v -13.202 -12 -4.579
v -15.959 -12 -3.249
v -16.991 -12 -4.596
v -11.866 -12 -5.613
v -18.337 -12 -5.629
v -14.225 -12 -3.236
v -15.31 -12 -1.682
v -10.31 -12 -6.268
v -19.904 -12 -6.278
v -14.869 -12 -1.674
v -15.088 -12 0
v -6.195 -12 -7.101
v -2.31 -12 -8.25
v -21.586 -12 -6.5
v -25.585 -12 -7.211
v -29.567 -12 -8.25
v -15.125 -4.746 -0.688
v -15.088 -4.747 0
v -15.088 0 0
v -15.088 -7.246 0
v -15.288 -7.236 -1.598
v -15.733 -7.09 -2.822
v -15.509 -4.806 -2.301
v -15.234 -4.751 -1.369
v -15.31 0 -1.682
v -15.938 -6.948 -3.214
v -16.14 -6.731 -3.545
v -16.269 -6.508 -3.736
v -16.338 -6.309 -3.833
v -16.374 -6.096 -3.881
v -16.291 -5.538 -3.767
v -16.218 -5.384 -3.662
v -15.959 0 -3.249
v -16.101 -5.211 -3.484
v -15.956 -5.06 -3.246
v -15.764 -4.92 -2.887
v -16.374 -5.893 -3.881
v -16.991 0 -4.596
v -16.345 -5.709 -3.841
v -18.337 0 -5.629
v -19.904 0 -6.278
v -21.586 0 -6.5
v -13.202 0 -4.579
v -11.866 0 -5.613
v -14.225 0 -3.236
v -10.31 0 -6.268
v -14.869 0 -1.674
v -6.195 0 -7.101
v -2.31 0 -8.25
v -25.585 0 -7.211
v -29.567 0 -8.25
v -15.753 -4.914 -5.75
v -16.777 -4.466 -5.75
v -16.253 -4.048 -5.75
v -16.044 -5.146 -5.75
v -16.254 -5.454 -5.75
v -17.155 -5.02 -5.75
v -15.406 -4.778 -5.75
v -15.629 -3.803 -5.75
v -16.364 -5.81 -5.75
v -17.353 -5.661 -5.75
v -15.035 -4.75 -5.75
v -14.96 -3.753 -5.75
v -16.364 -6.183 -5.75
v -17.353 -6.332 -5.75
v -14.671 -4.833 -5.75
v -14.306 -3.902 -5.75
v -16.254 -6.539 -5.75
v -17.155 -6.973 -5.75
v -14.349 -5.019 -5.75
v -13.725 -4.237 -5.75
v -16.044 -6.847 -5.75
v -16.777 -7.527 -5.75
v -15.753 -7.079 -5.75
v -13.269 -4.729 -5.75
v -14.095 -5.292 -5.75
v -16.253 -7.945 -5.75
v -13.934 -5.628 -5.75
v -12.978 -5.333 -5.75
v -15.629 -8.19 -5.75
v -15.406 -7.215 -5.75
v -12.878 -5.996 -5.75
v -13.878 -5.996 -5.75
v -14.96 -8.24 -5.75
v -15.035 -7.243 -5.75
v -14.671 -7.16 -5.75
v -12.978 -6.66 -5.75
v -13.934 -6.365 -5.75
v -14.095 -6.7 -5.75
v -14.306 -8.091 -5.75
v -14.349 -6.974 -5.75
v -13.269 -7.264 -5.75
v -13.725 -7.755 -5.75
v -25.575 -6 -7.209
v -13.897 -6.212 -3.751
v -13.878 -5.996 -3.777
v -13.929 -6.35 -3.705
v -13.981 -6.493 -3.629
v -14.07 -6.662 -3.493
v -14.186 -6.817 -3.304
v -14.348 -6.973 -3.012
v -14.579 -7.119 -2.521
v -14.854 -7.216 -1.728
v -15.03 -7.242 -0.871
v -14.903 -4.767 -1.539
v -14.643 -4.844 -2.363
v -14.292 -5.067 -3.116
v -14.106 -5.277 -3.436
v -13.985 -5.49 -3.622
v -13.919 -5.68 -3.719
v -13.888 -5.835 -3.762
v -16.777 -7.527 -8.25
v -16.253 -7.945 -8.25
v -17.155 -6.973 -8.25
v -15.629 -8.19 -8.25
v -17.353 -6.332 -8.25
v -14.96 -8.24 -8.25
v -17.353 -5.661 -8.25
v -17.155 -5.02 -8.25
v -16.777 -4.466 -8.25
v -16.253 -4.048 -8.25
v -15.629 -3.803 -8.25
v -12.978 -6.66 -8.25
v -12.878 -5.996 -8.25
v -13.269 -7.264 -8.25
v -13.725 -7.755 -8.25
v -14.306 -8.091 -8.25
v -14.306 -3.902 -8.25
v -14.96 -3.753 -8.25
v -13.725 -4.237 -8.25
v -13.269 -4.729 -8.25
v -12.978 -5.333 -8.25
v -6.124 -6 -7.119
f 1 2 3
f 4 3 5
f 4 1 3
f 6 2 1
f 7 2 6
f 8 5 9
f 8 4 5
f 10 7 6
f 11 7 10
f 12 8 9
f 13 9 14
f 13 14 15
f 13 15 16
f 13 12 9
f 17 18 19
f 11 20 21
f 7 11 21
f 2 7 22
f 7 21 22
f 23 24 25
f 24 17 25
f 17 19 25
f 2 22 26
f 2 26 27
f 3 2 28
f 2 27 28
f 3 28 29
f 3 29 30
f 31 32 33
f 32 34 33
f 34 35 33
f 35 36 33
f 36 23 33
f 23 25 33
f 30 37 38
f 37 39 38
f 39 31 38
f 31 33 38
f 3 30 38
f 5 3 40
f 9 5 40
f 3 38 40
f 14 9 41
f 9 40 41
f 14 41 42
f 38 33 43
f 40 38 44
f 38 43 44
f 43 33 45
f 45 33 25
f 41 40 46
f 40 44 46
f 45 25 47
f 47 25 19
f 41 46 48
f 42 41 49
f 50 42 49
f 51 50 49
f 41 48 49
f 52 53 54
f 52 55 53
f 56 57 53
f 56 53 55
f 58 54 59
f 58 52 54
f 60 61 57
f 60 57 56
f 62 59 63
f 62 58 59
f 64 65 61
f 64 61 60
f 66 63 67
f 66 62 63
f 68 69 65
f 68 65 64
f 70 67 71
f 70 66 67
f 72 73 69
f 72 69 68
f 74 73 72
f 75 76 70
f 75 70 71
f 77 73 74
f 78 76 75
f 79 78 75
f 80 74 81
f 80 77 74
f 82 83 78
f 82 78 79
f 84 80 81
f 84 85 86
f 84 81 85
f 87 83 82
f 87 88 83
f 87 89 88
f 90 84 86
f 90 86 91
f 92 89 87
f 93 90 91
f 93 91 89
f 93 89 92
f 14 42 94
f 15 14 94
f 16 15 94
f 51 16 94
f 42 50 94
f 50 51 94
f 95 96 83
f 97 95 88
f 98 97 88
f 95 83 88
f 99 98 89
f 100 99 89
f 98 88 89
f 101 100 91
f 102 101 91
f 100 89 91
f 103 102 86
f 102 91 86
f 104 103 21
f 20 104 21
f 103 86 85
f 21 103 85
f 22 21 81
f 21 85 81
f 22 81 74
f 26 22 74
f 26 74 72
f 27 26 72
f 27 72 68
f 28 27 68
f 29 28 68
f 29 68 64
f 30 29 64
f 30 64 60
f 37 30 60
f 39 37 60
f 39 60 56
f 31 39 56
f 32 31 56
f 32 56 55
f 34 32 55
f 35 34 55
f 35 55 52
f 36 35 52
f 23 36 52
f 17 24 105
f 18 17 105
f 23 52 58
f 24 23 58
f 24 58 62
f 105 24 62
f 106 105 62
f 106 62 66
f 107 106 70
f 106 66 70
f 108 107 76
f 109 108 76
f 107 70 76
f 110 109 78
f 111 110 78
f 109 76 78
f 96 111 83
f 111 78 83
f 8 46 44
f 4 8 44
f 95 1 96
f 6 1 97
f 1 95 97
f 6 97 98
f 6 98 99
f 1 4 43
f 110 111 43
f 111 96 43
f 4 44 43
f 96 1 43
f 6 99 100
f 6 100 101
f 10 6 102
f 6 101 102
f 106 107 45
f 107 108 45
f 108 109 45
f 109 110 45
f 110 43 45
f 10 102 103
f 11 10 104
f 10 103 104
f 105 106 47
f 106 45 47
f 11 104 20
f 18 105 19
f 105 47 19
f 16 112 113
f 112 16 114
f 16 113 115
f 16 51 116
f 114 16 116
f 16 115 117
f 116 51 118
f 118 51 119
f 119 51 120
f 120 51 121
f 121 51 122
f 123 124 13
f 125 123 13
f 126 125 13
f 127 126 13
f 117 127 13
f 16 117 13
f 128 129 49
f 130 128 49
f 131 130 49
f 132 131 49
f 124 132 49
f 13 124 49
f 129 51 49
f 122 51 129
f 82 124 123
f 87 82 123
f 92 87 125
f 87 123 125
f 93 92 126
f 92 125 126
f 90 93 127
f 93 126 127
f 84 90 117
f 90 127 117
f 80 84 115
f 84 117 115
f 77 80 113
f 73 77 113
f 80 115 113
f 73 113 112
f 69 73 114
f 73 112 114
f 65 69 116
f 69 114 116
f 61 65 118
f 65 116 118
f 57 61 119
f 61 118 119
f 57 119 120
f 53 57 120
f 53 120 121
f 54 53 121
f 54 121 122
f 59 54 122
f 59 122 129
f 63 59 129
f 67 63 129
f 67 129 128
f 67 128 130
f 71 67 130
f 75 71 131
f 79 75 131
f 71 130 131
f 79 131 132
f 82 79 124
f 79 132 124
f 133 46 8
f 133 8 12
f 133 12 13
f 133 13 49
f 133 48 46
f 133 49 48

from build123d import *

# Parameters (mm, degrees)
F1_DEPTH = 12
F2_R     = 1.25
F3_DEPTH = 25
F2_R_2   = 2.25
F4_DEPTH = 2.5


with BuildPart() as f1:
    # F0 (on Front) → F1 (new body)
    with BuildSketch(Plane.XZ):
        with BuildLine():
            ThreePointArc((-15.0881102346, 0), (-16.991298859, -4.5955766968), (-21.5863641351, -6.4999997655))
            Line((-21.5863641351, -6.4999997655), (-21.5863641351, -8.2499998827))
            Line((-21.5863641351, -8.2499998827), (-10.3100242913, -8.2499998827))
            Line((-10.3100242913, -8.2499998827), (-10.3100242913, -6.2677756805))
            ThreePointArc((-10.3100242913, -6.2677756805), (-13.7573675008, -3.9406572188), (-15.0881102346, 0))
        make_face()
        with BuildLine():
            Line((-21.5863641351, -8.2499998827), (-21.5863641351, -6.4999997655))
            add(Edge.make_bspline(
                [(-21.5863641351, -6.4999997655), (-22.9185539989, -6.7095944516), (-25.5951490164, -7.1307056669), (-28.238998845, -7.875768386), (-29.566956684, -8.2499998827)],
                knots=[0, 0, 0, 0, 0.4977181288, 1, 1, 1, 1], degree=3))
            Line((-29.566956684, -8.2499998827), (-21.5863641351, -8.2499998827))
        make_face()
        with BuildLine():
            add(Edge.make_bspline(
                [(-10.3100242913, -6.2677756805), (-8.8950325252, -6.524315434), (-6.1143970315, -7.0284480808), (-3.563055622, -7.847662156), (-2.3100242913, -8.2499998827)],
                knots=[0, 0, 0, 0, 0.508873518, 1, 1, 1, 1], degree=3))
            Line((-10.3100242913, -6.2677756805), (-10.3100242913, -8.2499998827))
            Line((-10.3100242913, -8.2499998827), (-2.3100242913, -8.2499998827))
        make_face()
    extrude(amount=F1_DEPTH)

    # F2 (on face) → F3 (cut)
    with BuildSketch(Plane(origin=(0, 0, -8.2499998827), x_dir=(1, 0, 0), z_dir=(0, 0, -1))):
        with Locations((-15.1280872524, 5.9963222593)):
            Circle(F2_R)
    extrude(amount=-F3_DEPTH, mode=Mode.SUBTRACT)

    # F2 (on face) → F4 (cut)
    with BuildSketch(Plane(origin=(0, 0, -8.2499998827), x_dir=(1, 0, 0), z_dir=(0, 0, -1))):
        with Locations((-15.1280872524, 5.9963222593)):
            Circle(F2_R_2)
        with Locations((-15.1280872524, 5.9963222593)):
            Circle(F2_R, mode=Mode.SUBTRACT)
    extrude(amount=-F4_DEPTH, mode=Mode.SUBTRACT)


solid = f1.part
